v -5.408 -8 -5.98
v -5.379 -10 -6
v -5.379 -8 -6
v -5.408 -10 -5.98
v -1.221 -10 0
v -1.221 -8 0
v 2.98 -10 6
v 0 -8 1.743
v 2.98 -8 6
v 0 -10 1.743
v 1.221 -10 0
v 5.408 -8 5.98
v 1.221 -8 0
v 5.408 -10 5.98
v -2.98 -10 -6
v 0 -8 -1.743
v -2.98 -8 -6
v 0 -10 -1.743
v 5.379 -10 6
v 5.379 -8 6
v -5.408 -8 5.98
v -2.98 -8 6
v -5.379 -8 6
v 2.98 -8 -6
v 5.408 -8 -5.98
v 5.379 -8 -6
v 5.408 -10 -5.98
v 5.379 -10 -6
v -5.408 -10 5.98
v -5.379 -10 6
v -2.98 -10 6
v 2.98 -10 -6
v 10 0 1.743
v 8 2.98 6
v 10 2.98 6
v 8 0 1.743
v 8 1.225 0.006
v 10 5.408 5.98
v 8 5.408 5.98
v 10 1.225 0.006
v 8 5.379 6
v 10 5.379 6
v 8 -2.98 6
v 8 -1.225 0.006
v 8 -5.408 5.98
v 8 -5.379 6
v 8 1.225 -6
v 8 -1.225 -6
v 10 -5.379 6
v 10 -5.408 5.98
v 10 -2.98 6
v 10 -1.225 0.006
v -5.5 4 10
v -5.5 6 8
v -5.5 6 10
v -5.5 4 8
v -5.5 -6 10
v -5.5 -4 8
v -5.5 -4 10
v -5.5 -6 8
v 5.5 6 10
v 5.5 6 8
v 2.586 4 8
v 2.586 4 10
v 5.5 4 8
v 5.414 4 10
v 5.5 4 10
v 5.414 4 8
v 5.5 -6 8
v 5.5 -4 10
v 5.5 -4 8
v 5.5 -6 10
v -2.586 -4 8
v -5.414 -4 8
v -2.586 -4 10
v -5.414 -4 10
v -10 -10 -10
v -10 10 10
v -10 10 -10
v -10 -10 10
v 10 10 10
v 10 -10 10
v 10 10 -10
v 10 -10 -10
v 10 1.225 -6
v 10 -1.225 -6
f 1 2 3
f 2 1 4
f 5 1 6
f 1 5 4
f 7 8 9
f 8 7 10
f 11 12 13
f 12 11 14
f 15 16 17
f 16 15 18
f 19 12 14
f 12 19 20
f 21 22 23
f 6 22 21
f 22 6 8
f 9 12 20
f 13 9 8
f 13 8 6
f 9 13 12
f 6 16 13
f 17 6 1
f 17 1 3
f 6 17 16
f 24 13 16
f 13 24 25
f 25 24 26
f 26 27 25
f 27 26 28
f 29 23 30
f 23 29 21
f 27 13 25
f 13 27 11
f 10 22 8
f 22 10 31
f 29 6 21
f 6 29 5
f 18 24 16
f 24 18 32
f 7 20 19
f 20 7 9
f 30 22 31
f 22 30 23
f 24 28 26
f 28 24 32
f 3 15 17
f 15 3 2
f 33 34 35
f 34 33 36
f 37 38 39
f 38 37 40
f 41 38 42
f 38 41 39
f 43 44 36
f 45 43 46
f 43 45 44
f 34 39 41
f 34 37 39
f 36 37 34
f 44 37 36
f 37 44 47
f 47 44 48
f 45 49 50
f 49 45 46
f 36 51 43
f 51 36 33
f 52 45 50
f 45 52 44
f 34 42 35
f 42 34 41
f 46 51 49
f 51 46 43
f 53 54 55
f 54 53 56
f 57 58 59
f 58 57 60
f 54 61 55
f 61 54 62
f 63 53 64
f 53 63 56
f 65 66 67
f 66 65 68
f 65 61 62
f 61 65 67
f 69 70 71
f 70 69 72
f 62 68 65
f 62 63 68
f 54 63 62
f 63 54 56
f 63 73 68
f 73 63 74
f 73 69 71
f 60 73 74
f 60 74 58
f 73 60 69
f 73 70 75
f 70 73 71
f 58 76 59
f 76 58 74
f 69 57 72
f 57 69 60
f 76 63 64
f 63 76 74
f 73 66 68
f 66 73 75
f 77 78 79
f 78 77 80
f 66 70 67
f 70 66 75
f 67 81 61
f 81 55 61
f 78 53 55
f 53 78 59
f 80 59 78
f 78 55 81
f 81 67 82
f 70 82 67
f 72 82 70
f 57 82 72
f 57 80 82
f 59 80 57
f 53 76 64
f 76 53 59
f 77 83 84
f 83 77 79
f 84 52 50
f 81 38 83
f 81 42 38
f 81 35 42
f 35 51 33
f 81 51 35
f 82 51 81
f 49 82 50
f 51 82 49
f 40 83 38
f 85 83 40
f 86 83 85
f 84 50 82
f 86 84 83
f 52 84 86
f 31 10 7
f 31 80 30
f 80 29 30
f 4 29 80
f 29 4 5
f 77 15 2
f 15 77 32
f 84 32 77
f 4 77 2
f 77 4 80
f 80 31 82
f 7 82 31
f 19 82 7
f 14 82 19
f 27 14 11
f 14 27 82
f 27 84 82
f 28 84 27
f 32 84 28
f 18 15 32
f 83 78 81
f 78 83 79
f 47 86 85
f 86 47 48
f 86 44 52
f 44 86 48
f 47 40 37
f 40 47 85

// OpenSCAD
rotate([0,0,180]) difference(){
    cube([20,20,20],center=true);
    difference(){
        union(){
            translate([0,9.005,0]) rotate([0,55,0]) cube([16,2.01,2],center=true);
            translate([0,9.005,0]) rotate([0,-55,0]) cube([16,2.01,2],center=true);
        }
        translate([0,8.5,7]) rotate([0,0,0]) cube([16,3.5,2],center=true);
        translate([0,8.5,-7]) rotate([0,0,0]) cube([16,3.5,2],center=true);
    }
    rotate([0,0,90]) difference(){
        union(){
            translate([0,9.005,0]) rotate([0,55,0]) cube([16,2.01,2],center=true);
            translate([0,9.005,0]) rotate([0,-55,0]) cube([16,2.01,2],center=true);
        }
        translate([0,8.5,7]) rotate([0,0,0]) cube([16,3.5,2],center=true);
        translate([0,8.5,-4]) rotate([0,0,0]) cube([16,3.5,8],center=true);
    }
    translate([-9,0,-2.9]) cube([2,2.45,6.2],center=true);
    
    rotate([90,0,0]) intersection(){
        translate([0,9.005,0]) cube([11,2.01,12],center=true);
        union(){
            translate([0,9.005,5]) cube([11,2.01,2],center=true);
            translate([0,9.005,-5]) cube([11,2.01,2],center=true);
            translate([0,9.005,0]) rotate([0,45,0]) cube([16,2.01,2],center=true);
        }
    }
}
